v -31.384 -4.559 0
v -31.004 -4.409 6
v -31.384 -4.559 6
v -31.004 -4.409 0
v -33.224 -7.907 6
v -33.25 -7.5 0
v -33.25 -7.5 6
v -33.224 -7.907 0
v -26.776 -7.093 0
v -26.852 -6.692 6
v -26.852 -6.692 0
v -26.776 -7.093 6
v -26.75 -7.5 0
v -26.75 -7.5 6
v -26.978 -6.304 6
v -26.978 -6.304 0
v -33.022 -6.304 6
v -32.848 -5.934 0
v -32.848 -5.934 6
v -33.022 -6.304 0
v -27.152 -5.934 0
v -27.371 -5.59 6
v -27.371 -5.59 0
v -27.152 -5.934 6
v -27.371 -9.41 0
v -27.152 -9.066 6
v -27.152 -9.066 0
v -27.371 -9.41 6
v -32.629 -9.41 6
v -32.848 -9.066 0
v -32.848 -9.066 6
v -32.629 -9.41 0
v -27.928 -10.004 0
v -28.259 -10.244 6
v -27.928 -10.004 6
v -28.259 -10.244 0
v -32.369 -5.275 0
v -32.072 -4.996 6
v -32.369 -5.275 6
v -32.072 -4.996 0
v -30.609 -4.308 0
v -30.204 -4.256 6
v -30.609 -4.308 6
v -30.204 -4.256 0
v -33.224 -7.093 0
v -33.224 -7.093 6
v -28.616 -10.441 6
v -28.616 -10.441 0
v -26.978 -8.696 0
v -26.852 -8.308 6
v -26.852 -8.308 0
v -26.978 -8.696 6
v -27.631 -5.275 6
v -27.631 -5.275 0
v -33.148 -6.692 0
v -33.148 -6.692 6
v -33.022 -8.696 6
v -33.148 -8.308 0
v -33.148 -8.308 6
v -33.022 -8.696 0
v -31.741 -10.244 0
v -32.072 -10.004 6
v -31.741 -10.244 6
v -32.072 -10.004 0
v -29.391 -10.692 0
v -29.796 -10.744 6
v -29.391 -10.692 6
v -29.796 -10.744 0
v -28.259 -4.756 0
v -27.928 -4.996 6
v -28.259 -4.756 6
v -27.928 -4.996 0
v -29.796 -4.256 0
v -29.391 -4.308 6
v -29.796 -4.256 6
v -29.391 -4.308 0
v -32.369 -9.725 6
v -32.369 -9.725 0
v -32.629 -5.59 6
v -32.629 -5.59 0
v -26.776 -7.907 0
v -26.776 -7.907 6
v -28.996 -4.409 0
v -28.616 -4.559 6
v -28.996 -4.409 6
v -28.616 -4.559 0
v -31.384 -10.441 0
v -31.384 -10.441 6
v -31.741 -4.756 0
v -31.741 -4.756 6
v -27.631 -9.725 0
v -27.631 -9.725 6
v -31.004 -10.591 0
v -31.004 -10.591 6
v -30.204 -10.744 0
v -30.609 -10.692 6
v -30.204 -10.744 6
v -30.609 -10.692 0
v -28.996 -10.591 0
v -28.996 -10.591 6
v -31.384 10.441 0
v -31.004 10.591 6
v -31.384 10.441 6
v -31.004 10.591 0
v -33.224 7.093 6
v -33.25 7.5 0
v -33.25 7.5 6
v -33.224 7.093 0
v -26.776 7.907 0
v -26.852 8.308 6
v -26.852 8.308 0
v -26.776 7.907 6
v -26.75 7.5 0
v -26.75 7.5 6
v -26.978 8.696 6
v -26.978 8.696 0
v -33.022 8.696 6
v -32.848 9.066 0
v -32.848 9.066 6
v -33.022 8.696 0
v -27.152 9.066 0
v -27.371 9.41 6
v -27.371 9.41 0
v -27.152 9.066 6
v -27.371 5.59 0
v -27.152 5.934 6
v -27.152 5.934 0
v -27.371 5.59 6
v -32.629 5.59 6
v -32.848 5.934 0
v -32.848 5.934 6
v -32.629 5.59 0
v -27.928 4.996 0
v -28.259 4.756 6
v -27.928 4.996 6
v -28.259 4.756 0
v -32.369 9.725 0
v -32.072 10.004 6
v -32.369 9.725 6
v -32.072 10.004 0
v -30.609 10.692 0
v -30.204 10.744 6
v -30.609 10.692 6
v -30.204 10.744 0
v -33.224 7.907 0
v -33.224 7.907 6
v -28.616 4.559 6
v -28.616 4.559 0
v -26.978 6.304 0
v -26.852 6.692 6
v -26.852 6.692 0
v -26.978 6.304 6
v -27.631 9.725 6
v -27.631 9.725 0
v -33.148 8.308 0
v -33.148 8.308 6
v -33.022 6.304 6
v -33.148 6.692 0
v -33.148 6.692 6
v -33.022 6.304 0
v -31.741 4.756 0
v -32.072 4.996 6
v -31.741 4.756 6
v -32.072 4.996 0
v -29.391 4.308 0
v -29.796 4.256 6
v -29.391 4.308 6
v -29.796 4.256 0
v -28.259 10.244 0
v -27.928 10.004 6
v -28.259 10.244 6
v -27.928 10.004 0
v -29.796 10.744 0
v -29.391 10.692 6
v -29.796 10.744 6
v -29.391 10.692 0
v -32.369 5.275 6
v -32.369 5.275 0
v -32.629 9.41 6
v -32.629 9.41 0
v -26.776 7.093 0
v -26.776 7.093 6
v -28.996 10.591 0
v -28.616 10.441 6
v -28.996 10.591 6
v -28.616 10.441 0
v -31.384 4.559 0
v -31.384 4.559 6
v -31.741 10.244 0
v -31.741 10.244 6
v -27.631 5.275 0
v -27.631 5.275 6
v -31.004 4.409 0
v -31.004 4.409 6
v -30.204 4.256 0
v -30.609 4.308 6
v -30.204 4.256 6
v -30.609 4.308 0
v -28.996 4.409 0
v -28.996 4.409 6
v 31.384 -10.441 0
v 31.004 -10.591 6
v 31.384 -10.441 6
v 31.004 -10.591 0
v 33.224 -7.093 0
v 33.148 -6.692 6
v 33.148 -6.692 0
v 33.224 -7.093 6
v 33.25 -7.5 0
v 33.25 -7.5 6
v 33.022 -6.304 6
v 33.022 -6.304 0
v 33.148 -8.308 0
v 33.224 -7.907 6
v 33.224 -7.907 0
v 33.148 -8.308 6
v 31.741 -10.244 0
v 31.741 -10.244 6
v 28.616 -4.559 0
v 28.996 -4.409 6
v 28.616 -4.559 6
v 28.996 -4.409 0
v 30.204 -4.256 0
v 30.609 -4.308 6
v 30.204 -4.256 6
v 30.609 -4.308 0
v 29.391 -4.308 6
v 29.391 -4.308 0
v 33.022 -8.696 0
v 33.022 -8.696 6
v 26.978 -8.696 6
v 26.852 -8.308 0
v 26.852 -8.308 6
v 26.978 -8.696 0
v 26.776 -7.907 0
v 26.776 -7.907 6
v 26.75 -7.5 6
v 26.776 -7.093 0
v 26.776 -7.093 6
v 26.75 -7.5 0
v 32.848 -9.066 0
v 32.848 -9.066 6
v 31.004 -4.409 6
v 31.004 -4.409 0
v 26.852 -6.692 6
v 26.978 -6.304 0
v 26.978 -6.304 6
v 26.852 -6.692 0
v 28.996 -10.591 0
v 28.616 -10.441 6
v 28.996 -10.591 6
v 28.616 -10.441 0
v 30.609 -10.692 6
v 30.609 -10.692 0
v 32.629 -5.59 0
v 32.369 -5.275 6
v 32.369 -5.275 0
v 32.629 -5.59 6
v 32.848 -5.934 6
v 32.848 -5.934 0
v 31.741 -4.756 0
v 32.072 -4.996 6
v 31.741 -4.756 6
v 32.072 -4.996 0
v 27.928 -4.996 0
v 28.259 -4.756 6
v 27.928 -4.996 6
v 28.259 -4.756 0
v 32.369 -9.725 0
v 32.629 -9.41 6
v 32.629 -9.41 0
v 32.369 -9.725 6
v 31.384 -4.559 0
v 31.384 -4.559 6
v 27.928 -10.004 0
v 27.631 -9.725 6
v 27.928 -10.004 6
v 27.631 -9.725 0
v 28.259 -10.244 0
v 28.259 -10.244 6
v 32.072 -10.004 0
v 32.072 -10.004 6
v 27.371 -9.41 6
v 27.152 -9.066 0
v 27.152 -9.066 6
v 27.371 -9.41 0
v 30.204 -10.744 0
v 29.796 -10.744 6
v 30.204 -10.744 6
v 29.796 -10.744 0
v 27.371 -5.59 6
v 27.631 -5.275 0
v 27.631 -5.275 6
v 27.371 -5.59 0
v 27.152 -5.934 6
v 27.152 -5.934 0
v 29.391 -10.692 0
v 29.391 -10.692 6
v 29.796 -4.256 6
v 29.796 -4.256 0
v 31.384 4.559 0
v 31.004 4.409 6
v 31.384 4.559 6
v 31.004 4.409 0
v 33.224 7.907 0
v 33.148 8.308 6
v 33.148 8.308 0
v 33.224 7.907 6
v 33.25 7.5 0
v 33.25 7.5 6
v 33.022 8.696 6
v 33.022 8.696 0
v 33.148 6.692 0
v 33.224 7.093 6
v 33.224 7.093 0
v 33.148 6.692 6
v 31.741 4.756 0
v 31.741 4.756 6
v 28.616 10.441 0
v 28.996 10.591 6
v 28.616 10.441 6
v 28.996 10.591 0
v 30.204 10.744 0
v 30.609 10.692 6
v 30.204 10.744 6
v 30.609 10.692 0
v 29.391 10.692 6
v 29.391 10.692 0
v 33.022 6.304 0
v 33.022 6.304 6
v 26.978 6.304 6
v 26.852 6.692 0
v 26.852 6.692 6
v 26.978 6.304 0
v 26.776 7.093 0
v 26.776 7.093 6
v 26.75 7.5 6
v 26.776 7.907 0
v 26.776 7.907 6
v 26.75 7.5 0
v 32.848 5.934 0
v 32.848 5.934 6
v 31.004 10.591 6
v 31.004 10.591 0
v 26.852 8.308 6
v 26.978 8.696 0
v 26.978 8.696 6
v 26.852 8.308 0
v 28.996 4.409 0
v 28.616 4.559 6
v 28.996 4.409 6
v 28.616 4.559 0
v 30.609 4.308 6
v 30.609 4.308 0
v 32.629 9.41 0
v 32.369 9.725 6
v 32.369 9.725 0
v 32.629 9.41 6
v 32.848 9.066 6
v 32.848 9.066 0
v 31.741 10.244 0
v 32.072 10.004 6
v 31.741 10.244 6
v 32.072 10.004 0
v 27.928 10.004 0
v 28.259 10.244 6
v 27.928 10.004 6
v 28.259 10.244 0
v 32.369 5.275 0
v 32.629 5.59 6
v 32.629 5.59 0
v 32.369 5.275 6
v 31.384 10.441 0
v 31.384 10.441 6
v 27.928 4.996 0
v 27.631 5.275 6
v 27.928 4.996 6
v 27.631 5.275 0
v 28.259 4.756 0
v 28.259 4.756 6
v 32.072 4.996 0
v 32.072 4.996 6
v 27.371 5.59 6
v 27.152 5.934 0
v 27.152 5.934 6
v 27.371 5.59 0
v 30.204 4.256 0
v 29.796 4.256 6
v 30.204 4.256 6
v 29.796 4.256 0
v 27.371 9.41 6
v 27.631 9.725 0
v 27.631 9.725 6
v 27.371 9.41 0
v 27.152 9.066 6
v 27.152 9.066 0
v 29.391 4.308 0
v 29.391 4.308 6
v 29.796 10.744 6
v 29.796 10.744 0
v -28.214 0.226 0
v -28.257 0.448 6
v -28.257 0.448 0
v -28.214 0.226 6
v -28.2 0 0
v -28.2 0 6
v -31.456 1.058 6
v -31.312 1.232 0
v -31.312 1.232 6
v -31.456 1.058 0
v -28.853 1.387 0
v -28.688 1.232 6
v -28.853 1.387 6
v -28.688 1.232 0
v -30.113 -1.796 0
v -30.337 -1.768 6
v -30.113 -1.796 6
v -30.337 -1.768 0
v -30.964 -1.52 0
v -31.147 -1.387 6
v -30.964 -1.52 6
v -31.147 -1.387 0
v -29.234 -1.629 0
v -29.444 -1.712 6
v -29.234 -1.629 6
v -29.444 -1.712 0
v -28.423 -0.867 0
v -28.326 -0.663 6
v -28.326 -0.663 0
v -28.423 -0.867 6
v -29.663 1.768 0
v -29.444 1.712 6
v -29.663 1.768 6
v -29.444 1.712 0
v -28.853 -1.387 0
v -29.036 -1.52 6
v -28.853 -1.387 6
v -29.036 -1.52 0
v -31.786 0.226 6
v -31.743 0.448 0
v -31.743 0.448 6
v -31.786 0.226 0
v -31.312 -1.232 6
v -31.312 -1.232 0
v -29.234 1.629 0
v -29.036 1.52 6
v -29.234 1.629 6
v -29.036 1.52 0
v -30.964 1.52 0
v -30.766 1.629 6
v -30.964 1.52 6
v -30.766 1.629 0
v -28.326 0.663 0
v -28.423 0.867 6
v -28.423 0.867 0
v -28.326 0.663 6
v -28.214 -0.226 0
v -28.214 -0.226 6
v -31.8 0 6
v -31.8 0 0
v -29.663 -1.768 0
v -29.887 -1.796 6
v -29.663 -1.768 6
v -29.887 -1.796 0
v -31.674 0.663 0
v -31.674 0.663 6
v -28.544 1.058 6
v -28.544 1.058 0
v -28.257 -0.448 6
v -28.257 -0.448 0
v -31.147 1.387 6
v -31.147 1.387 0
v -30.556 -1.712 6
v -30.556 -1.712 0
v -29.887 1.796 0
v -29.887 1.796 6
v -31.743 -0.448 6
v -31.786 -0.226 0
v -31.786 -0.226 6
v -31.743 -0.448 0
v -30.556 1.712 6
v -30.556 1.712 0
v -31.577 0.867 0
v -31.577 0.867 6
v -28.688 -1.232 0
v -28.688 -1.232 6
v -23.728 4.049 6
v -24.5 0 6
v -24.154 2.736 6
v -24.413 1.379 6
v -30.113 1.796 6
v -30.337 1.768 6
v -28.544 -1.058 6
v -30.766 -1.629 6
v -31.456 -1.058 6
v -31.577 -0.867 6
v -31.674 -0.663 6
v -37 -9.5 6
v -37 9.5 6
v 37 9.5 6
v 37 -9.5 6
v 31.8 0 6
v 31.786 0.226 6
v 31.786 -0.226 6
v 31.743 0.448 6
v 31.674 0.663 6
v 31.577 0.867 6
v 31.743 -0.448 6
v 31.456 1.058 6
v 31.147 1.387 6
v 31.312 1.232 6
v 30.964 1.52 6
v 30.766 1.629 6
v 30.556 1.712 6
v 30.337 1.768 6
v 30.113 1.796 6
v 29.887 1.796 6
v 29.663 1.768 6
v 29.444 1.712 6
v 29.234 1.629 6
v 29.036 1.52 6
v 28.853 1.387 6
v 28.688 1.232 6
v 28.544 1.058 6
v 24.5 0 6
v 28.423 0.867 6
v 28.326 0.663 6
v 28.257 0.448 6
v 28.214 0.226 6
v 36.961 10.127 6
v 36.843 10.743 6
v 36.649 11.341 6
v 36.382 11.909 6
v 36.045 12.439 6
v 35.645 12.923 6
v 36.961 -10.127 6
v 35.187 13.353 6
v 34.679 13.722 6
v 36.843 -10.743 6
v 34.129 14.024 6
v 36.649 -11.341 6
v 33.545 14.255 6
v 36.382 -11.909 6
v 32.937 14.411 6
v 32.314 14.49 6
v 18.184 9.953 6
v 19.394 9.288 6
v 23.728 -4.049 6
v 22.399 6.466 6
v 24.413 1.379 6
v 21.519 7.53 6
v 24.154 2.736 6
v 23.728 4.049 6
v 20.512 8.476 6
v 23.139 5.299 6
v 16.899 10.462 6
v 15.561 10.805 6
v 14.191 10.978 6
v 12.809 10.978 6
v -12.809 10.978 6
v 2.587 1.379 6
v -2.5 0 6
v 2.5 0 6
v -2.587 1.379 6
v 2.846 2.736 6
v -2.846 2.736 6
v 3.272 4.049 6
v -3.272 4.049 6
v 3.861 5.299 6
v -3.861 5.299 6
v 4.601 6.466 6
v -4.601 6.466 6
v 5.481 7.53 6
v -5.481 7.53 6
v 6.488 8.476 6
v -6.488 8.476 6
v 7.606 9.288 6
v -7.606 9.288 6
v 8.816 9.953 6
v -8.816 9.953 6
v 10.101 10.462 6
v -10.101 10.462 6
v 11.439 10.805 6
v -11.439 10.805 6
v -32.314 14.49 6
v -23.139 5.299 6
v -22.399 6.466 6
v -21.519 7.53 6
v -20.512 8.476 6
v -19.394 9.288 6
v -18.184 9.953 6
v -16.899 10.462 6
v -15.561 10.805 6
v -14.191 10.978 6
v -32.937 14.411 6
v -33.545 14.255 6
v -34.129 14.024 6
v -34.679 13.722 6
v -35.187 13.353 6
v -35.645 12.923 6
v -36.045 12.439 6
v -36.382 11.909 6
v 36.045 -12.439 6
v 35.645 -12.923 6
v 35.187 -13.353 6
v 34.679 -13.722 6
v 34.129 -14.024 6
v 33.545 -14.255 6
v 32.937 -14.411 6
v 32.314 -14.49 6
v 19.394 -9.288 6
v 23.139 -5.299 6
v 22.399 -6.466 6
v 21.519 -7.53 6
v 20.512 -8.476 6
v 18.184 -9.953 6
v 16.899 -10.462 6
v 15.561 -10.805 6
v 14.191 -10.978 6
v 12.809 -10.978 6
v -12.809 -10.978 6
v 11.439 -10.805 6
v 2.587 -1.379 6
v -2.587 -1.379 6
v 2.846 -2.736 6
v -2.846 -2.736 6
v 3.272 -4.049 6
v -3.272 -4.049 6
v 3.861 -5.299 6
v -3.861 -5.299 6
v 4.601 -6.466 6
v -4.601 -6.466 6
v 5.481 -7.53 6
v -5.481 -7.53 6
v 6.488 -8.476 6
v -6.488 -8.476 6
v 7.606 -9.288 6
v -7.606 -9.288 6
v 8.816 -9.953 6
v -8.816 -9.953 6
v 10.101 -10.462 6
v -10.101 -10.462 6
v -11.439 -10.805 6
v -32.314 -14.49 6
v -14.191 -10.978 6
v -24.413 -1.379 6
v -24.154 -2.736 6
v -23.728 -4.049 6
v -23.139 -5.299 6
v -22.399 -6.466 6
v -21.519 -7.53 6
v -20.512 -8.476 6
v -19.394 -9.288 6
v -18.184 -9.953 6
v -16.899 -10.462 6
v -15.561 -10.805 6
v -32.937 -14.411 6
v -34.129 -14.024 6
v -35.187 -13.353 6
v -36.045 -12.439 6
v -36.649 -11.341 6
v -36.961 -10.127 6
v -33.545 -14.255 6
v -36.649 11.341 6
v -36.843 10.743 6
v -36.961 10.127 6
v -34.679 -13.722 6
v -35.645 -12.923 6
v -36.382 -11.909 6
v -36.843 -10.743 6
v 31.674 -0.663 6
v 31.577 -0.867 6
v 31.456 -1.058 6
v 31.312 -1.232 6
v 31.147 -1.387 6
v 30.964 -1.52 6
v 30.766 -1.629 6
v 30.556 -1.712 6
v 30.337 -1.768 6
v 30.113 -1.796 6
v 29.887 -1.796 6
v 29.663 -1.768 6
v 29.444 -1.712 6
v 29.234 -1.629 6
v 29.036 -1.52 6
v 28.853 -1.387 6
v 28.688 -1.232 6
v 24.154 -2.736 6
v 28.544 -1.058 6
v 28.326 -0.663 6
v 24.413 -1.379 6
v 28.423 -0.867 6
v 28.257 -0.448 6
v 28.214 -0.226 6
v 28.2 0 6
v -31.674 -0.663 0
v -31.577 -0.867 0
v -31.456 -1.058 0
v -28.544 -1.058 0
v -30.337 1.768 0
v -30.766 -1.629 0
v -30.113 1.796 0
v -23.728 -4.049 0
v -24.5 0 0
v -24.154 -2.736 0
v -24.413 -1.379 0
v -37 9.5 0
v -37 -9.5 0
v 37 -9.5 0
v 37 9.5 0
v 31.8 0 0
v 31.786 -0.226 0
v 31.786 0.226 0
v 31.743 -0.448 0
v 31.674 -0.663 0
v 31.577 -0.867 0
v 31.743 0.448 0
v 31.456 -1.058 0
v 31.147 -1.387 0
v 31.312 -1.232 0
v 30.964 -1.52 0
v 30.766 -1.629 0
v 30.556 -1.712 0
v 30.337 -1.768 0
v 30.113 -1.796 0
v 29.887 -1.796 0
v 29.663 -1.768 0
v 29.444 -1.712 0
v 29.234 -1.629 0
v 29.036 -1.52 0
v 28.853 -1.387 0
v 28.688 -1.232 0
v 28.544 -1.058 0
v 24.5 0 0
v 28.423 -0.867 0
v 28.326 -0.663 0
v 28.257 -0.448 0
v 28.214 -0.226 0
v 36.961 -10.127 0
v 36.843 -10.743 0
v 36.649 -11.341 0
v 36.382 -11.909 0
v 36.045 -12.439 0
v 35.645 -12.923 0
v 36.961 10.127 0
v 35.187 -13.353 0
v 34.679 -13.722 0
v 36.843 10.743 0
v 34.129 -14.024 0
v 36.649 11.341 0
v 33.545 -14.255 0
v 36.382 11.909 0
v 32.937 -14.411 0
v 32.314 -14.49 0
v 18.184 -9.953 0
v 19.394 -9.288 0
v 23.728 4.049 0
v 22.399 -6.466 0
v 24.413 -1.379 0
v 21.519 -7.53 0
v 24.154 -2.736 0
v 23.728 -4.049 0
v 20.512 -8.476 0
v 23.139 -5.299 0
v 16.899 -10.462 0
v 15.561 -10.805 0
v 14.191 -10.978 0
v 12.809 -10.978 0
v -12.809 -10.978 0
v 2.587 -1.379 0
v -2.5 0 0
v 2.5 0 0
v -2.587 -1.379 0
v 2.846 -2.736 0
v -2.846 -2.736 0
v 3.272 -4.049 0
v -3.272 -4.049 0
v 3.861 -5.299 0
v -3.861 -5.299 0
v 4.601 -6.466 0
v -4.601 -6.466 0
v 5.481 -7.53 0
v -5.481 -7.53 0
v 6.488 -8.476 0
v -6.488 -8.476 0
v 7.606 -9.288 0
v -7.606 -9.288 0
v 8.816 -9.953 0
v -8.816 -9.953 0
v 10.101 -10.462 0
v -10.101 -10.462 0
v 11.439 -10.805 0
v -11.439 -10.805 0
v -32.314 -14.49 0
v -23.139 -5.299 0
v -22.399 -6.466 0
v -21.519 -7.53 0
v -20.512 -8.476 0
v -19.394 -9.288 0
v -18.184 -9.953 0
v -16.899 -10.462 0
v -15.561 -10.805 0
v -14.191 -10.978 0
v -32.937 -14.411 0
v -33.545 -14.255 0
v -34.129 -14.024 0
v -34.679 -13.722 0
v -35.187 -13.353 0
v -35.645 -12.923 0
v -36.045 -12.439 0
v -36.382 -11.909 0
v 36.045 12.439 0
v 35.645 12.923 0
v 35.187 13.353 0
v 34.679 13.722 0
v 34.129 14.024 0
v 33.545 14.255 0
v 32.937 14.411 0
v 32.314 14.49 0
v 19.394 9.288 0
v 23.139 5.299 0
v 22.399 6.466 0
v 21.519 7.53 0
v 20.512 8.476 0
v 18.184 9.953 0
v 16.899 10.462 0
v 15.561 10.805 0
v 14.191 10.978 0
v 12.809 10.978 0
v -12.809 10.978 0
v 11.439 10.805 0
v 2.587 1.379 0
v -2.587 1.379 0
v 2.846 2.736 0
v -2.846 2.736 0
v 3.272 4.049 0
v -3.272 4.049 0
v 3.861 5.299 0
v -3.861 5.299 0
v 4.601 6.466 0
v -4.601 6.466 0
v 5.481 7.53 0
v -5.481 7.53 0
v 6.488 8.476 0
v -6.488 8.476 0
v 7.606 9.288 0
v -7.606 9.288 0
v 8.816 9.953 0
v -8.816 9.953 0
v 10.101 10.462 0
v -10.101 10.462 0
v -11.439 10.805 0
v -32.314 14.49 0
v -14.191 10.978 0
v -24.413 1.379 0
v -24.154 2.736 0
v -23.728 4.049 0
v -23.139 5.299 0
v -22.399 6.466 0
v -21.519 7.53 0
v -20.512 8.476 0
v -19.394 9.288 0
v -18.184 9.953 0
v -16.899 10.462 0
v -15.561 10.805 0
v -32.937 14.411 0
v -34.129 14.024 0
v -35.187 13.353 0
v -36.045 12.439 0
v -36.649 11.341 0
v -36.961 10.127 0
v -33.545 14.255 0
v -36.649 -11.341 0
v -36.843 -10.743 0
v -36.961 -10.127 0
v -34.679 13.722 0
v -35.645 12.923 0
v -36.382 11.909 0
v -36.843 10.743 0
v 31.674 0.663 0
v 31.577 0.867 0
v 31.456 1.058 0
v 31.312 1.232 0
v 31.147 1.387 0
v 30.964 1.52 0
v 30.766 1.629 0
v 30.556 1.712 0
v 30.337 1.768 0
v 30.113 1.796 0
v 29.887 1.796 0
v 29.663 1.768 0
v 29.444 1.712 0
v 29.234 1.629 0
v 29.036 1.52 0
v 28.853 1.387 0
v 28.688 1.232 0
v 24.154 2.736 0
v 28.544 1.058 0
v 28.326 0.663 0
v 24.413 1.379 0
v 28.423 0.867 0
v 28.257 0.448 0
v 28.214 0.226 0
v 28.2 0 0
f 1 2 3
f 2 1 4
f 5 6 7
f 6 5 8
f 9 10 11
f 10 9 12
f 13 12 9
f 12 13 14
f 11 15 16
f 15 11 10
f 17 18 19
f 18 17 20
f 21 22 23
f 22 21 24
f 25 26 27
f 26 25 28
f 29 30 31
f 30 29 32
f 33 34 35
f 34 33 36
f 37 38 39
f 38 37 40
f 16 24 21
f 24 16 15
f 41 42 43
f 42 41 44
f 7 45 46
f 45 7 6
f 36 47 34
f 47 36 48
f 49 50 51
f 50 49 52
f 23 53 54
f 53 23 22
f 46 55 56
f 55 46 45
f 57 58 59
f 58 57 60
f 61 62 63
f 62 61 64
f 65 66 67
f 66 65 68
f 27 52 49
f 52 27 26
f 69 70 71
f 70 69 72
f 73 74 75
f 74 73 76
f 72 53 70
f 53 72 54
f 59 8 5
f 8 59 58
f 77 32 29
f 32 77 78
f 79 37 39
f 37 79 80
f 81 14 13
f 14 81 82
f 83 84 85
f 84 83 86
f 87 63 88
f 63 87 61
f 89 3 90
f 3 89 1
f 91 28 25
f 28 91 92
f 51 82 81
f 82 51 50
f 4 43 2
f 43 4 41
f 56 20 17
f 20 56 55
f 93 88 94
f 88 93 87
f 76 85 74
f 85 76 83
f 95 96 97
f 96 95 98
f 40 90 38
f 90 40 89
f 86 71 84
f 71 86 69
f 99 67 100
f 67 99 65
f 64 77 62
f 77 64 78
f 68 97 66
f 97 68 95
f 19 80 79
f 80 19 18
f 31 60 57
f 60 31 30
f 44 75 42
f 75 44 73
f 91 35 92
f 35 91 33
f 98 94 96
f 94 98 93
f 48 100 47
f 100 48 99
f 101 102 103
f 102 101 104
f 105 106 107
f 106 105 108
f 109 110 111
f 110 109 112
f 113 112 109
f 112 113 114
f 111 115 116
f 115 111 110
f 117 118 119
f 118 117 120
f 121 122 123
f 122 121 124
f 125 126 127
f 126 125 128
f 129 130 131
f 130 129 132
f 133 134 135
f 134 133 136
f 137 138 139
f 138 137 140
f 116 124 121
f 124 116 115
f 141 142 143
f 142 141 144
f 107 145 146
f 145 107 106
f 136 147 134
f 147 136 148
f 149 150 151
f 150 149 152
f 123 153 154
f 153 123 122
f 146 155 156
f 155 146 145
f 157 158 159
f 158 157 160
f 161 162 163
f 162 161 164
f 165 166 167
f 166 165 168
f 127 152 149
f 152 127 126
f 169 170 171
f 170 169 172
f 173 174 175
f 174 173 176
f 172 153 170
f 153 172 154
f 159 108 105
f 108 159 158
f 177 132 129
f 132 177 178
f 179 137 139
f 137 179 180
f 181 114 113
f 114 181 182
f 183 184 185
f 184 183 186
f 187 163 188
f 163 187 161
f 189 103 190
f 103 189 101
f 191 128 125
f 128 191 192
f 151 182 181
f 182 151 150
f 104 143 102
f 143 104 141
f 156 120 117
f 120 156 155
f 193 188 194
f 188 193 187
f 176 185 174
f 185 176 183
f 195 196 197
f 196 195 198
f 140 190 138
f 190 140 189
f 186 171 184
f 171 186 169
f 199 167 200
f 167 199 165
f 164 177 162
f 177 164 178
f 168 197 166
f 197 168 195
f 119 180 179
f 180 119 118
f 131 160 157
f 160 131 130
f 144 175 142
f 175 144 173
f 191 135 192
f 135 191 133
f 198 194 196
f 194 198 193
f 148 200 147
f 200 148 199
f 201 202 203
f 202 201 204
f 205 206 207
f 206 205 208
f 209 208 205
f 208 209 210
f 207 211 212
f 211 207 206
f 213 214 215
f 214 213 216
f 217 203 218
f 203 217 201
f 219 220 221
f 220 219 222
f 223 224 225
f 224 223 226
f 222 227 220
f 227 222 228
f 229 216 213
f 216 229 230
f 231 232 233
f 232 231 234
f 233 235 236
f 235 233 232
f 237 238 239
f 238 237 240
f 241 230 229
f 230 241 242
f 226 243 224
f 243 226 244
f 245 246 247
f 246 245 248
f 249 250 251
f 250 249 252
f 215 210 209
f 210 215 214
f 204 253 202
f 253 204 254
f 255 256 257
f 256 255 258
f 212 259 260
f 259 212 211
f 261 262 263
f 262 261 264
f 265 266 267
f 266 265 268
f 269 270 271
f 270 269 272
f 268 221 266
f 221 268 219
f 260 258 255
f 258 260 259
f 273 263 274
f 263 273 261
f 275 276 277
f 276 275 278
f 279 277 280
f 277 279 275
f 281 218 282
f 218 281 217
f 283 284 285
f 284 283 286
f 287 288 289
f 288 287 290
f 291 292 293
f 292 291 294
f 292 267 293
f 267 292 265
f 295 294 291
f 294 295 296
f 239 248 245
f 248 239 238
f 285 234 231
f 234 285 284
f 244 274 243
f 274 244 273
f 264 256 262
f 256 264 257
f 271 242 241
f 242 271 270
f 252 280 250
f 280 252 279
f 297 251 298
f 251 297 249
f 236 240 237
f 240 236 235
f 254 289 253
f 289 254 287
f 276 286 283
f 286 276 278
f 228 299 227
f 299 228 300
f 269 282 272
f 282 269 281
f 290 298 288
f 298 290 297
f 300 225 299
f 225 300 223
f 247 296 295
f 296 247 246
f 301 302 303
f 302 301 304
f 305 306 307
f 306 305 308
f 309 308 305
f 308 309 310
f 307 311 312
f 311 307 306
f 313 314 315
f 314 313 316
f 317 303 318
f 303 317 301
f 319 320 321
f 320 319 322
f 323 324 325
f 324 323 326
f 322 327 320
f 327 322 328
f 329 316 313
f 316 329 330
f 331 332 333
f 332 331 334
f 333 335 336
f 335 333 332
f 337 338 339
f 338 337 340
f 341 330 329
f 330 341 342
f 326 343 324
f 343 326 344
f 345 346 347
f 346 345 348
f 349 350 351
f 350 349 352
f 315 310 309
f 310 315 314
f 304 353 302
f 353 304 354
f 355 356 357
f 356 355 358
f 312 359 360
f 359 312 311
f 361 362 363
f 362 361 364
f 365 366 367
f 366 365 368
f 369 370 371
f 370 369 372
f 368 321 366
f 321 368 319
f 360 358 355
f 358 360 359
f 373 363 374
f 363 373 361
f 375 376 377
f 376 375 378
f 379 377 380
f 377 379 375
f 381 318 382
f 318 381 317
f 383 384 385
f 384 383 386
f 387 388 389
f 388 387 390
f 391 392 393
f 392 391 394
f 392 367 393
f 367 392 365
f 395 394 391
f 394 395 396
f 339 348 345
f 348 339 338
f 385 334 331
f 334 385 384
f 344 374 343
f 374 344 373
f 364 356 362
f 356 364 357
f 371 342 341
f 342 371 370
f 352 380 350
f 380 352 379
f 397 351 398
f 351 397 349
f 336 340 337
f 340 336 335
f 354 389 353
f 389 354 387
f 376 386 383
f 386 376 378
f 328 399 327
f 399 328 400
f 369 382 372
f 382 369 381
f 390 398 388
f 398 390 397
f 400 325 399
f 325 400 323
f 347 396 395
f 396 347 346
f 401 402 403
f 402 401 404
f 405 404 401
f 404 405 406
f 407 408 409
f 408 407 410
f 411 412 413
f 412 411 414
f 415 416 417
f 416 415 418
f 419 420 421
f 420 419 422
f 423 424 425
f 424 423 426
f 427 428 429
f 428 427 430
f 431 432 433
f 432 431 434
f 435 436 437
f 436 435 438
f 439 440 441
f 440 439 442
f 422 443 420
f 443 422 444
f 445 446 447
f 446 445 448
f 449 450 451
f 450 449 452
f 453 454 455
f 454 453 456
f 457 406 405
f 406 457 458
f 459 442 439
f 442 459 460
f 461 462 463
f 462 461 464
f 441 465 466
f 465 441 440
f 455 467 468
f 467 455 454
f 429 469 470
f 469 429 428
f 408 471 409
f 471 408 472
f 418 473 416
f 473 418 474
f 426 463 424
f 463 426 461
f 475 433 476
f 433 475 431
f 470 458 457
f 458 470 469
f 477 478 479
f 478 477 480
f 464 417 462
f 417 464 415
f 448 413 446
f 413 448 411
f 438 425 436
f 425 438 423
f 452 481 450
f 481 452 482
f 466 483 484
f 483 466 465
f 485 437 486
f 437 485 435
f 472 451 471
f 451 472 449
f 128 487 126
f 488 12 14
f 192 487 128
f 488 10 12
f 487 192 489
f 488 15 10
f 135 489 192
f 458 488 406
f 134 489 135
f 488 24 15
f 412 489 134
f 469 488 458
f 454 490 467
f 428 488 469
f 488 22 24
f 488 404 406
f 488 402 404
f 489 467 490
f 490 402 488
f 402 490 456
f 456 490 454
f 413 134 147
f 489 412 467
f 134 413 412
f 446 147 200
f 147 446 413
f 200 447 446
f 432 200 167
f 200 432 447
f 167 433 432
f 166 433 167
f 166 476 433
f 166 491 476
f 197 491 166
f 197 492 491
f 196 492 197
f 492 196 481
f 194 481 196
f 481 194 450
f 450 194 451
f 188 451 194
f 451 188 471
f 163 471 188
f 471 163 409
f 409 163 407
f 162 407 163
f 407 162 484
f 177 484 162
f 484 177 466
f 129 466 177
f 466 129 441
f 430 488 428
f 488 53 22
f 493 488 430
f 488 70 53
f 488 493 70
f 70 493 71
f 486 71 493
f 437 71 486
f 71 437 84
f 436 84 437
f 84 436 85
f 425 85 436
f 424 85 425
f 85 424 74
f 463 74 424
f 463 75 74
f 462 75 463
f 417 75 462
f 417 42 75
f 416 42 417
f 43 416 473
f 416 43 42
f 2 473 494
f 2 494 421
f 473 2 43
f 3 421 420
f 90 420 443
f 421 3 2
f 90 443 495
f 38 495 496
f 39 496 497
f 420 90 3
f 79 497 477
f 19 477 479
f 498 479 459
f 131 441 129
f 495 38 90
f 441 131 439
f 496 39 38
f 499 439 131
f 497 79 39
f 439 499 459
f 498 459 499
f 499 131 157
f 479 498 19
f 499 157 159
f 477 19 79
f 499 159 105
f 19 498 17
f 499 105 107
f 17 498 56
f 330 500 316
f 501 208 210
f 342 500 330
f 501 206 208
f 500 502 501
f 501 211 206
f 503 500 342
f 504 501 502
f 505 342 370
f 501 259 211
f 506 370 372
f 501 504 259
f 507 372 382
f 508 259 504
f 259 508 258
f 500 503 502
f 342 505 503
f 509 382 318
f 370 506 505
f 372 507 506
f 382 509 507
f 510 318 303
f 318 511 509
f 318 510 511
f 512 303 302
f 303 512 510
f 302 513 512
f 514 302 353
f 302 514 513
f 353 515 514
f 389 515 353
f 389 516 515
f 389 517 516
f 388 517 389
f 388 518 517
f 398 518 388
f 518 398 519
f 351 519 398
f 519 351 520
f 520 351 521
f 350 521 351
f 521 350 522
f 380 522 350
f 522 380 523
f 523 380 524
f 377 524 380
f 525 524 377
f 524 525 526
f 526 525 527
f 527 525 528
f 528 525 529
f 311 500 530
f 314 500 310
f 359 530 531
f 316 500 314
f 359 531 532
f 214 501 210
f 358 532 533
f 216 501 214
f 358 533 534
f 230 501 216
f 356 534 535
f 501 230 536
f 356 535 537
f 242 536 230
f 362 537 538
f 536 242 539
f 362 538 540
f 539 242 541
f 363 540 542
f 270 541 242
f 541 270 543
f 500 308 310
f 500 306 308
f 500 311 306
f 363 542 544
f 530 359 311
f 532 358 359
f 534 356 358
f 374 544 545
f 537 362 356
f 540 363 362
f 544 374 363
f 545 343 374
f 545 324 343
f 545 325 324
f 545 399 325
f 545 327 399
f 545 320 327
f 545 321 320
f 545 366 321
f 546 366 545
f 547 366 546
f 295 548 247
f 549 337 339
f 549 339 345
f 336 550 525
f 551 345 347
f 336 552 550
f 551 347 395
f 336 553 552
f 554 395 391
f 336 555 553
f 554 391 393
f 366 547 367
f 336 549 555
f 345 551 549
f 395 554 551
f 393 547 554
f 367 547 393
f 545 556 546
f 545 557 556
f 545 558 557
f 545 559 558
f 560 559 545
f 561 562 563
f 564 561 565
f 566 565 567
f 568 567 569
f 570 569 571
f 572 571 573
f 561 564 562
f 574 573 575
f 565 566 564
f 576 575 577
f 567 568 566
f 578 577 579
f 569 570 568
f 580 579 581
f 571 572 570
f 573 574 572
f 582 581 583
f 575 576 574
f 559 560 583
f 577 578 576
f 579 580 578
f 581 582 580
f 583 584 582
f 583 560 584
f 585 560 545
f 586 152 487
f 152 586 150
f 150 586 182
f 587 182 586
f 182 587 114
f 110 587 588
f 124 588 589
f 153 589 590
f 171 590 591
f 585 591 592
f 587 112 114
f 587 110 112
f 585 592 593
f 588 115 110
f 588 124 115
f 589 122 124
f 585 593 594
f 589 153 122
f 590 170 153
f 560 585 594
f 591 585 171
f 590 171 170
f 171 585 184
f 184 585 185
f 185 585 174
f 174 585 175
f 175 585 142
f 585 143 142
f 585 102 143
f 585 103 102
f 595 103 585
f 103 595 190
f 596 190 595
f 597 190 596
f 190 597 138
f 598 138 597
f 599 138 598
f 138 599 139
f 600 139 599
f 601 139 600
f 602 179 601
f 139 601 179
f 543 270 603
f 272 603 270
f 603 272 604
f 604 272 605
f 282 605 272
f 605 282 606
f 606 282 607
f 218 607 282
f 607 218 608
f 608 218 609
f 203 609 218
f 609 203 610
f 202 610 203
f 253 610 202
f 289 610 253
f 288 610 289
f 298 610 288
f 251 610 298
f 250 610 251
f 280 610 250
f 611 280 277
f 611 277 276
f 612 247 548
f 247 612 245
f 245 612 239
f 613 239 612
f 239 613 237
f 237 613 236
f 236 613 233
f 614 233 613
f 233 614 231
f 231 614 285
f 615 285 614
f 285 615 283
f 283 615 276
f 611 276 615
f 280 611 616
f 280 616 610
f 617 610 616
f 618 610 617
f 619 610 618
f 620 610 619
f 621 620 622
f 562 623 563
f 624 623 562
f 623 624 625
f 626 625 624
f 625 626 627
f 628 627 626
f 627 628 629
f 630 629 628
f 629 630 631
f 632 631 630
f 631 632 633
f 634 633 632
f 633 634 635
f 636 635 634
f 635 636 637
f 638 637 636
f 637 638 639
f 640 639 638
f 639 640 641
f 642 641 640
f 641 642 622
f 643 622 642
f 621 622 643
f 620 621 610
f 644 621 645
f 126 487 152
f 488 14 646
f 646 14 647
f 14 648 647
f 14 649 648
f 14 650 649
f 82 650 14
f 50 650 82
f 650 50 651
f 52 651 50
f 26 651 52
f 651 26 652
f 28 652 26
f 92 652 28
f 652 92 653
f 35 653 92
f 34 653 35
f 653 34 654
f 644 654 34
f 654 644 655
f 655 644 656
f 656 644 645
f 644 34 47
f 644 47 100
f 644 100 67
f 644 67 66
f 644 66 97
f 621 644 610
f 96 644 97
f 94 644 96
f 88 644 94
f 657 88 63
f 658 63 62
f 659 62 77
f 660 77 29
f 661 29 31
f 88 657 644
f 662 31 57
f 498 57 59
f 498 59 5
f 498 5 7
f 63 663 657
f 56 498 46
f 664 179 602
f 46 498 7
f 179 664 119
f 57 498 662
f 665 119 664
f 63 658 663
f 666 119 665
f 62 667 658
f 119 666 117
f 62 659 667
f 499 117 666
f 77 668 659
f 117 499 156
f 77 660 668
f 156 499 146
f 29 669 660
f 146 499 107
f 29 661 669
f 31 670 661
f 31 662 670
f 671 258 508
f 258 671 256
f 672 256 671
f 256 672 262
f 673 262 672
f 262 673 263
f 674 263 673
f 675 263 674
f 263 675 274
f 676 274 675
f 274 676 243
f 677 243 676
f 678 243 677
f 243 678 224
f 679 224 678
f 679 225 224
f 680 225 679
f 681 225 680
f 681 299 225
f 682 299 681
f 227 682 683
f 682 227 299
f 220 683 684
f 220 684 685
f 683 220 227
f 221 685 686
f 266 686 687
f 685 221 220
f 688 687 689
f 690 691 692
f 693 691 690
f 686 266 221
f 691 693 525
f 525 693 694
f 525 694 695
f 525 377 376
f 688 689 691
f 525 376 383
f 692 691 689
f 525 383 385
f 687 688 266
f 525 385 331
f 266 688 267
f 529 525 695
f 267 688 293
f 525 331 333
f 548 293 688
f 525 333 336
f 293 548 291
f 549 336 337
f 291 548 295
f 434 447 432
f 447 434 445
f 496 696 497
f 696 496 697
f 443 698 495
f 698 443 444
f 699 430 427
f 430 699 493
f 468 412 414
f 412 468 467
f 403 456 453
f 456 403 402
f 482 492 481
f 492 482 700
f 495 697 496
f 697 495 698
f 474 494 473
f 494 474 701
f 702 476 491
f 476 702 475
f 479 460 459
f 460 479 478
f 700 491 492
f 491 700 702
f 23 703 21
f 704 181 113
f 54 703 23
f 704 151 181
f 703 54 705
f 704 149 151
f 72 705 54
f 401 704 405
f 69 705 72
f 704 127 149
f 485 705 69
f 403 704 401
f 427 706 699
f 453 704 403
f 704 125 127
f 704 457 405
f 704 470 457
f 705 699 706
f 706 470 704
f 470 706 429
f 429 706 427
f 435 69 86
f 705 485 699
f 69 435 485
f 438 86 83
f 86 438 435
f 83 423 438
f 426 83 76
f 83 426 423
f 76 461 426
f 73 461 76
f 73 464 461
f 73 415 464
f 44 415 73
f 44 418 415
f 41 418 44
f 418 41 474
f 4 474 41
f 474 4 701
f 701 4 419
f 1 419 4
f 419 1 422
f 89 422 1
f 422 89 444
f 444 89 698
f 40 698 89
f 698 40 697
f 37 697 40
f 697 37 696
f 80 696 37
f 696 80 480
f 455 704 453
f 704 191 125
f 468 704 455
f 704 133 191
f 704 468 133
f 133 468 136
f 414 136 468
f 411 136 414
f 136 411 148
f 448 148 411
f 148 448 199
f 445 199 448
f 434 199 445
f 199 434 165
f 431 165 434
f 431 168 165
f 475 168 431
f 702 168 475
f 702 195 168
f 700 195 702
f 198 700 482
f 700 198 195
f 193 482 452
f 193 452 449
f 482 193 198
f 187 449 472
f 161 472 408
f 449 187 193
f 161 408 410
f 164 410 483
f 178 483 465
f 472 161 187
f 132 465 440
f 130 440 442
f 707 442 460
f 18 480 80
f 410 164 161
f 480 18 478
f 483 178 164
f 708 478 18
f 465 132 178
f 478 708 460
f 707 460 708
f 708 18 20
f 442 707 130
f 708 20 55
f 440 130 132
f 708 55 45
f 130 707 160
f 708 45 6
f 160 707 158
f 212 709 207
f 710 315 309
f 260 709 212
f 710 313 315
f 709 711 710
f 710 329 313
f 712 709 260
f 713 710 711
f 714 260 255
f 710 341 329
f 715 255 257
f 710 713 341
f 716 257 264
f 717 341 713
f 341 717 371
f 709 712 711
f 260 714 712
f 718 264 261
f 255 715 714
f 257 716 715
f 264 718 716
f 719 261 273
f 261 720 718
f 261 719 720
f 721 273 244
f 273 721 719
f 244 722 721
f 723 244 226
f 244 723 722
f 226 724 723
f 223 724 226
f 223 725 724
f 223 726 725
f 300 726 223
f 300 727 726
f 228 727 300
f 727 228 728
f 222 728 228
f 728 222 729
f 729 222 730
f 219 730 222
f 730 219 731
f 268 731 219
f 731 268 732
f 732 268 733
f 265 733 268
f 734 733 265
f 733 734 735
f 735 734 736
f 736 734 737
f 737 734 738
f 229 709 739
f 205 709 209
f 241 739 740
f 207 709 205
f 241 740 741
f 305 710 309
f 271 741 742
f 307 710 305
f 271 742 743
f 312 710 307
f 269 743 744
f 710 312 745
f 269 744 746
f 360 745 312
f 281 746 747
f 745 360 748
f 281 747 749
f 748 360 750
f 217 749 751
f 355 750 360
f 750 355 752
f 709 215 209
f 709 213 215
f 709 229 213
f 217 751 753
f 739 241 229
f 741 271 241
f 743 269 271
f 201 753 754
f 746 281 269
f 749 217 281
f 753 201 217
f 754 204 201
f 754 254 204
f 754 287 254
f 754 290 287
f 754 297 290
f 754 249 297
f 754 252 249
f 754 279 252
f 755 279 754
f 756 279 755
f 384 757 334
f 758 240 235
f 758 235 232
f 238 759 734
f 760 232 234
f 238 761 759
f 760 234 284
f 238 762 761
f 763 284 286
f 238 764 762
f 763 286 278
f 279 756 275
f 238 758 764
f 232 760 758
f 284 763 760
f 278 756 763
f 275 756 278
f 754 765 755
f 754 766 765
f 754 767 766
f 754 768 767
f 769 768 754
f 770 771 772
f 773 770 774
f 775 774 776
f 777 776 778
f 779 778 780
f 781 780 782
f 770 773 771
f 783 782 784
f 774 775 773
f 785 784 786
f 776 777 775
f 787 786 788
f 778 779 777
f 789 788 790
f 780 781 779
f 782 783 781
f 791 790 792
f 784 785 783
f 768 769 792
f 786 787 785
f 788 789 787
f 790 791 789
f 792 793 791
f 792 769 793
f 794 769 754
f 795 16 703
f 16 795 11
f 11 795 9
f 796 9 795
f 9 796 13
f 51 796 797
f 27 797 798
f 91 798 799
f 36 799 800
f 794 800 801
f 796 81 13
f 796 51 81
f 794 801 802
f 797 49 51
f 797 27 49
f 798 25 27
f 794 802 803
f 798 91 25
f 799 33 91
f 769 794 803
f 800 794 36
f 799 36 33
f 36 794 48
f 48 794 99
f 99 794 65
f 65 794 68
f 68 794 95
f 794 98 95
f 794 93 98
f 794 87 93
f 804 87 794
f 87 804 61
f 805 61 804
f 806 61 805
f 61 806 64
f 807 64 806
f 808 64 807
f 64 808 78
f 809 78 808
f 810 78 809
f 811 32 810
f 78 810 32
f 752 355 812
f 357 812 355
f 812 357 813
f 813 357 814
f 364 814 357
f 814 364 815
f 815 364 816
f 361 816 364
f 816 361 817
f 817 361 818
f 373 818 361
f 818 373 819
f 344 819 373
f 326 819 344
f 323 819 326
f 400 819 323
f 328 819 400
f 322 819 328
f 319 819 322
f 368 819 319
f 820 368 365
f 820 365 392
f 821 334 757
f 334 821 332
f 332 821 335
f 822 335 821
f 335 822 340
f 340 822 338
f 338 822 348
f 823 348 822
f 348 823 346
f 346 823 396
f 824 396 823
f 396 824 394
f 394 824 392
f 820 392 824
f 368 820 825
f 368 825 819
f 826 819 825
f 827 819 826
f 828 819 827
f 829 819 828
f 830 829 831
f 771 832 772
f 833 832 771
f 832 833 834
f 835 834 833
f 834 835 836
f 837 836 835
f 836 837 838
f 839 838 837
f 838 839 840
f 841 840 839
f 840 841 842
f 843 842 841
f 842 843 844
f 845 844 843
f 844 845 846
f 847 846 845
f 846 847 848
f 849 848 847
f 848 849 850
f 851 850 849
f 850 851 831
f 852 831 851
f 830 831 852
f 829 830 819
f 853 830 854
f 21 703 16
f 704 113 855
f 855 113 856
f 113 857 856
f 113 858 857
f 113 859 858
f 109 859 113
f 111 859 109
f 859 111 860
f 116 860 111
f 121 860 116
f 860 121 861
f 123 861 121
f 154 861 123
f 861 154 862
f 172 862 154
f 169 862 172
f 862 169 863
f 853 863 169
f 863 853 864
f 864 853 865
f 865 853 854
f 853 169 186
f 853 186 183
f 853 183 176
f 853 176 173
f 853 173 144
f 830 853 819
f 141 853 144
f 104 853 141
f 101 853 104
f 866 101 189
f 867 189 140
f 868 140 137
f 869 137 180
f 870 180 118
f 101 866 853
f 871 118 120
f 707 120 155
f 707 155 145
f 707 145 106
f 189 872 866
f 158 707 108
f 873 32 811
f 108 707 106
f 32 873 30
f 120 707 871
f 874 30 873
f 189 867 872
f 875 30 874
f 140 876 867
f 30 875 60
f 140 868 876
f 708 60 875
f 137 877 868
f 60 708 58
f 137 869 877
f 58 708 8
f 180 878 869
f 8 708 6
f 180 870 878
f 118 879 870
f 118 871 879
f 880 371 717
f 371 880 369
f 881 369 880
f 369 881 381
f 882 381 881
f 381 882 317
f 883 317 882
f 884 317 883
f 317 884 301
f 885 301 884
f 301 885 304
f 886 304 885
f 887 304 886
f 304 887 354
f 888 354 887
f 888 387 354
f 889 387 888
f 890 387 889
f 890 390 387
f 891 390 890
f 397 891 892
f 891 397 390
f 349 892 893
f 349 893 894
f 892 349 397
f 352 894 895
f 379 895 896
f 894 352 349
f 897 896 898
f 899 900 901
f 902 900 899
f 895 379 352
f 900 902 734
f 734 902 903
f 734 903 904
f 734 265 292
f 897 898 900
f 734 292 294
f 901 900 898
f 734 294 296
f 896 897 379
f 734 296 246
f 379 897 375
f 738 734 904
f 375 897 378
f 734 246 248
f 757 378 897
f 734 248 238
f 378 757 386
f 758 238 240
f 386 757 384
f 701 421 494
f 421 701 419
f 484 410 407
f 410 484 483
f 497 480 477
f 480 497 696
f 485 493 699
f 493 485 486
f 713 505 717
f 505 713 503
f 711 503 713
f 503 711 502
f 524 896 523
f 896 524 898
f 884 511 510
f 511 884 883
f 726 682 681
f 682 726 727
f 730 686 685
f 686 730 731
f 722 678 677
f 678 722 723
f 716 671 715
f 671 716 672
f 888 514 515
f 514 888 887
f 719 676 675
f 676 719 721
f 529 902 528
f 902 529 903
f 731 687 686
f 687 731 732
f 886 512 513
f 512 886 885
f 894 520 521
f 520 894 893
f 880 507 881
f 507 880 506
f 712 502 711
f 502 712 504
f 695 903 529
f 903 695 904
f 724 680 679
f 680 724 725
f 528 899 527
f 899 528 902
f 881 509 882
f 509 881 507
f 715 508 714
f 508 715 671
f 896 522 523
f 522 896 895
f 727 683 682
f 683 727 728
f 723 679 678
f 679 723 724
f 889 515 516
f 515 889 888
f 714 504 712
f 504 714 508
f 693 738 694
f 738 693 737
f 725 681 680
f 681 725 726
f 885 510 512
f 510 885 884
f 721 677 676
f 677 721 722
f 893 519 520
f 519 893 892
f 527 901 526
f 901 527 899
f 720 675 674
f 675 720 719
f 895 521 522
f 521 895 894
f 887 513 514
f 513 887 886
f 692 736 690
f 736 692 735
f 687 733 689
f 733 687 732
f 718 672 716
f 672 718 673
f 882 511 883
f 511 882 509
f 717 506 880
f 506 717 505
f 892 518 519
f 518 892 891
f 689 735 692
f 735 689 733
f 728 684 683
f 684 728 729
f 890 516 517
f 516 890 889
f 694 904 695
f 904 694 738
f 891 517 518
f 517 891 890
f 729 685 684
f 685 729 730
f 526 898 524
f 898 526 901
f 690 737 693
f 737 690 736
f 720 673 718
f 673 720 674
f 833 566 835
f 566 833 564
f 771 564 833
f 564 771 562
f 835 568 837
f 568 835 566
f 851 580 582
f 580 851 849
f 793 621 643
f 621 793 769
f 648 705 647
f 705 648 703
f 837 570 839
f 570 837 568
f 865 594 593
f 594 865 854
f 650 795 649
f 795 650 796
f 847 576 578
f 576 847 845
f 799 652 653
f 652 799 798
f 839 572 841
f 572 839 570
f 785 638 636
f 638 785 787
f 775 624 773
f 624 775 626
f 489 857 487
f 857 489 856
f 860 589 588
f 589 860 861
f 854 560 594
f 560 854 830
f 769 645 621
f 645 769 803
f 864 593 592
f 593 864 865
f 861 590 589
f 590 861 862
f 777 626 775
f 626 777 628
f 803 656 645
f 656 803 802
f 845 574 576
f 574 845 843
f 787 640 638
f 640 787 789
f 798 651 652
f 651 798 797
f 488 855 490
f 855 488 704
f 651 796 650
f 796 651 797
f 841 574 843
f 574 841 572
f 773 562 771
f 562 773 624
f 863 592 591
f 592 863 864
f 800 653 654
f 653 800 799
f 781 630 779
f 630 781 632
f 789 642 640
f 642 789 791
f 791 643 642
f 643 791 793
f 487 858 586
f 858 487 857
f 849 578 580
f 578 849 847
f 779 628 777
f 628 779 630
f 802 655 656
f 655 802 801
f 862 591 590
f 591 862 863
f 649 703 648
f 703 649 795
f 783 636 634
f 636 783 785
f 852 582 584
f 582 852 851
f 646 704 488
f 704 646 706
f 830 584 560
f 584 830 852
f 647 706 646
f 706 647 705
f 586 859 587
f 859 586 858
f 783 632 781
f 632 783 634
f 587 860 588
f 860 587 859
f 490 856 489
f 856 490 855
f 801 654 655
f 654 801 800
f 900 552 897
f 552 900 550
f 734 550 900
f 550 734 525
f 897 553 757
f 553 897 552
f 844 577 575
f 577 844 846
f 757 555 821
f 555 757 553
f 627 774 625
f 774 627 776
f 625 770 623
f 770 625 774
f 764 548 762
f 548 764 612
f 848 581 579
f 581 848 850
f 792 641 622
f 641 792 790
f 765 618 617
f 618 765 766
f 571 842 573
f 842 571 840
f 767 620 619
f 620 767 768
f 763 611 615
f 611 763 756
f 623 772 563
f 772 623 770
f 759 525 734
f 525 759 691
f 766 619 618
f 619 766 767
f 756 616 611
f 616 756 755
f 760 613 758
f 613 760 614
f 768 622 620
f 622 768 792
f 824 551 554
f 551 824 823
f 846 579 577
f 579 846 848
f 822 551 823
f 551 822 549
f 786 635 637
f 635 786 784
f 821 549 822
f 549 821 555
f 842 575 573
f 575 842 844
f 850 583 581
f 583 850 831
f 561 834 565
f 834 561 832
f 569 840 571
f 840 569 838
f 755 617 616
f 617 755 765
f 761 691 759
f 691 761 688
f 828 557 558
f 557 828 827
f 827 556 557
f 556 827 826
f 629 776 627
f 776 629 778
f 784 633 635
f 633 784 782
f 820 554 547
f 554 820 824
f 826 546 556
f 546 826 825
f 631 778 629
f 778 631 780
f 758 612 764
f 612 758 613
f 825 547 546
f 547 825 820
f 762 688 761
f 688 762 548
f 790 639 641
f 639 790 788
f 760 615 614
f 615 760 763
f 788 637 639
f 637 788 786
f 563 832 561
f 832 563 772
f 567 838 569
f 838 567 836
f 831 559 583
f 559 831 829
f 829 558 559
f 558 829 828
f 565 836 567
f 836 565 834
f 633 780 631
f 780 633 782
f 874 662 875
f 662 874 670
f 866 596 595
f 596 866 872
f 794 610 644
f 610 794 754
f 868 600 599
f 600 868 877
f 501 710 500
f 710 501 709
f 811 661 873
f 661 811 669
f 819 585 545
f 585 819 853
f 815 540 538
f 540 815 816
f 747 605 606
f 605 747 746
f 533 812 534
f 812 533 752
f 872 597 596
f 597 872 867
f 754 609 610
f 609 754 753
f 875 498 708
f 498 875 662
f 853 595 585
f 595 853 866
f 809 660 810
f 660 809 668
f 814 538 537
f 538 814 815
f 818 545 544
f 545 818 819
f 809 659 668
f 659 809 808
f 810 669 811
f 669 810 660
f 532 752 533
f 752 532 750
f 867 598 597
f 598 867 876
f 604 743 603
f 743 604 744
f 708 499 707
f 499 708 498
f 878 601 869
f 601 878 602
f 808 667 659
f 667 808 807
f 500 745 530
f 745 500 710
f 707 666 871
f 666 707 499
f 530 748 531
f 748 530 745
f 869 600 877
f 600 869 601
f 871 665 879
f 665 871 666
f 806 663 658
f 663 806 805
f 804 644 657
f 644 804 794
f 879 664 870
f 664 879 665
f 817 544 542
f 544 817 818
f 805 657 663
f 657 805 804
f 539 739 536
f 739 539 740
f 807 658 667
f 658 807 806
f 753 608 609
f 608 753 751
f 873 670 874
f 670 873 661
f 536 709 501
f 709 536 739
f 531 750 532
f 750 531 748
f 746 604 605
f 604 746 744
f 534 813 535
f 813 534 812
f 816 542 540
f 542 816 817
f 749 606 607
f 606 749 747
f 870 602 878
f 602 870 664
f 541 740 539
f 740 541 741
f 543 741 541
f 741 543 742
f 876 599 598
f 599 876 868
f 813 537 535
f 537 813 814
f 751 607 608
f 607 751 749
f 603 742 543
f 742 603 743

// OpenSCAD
$fn = 50;


difference() {
	union() {
		hull() {
			translate(v = [-32.0000000000, 9.5000000000, 0]) {
				cylinder(h = 6, r = 5);
			}
			translate(v = [32.0000000000, 9.5000000000, 0]) {
				cylinder(h = 6, r = 5);
			}
			translate(v = [-32.0000000000, -9.5000000000, 0]) {
				cylinder(h = 6, r = 5);
			}
			translate(v = [32.0000000000, -9.5000000000, 0]) {
				cylinder(h = 6, r = 5);
			}
		}
	}
	union() {
		#translate(v = [-30.0000000000, -7.5000000000, 0]) {
			cylinder(h = 6, r = 3.2500000000);
		}
		#translate(v = [-30.0000000000, 7.5000000000, 0]) {
			cylinder(h = 6, r = 3.2500000000);
		}
		#translate(v = [30.0000000000, -7.5000000000, 0]) {
			cylinder(h = 6, r = 3.2500000000);
		}
		#translate(v = [30.0000000000, 7.5000000000, 0]) {
			cylinder(h = 6, r = 3.2500000000);
		}
		#translate(v = [-30.0000000000, -7.5000000000, -100.0000000000]) {
			cylinder(h = 200, r = 3.2500000000);
		}
		#translate(v = [-30.0000000000, 7.5000000000, -100.0000000000]) {
			cylinder(h = 200, r = 3.2500000000);
		}
		#translate(v = [30.0000000000, -7.5000000000, -100.0000000000]) {
			cylinder(h = 200, r = 3.2500000000);
		}
		#translate(v = [30.0000000000, 7.5000000000, -100.0000000000]) {
			cylinder(h = 200, r = 3.2500000000);
		}
		#translate(v = [-30.0000000000, -7.5000000000, 0]) {
			cylinder(h = 6, r = 1.8000000000);
		}
		#translate(v = [-30.0000000000, 0.0000000000, 0]) {
			cylinder(h = 6, r = 1.8000000000);
		}
		#translate(v = [-30.0000000000, 7.5000000000, 0]) {
			cylinder(h = 6, r = 1.8000000000);
		}
		#translate(v = [30.0000000000, -7.5000000000, 0]) {
			cylinder(h = 6, r = 1.8000000000);
		}
		#translate(v = [30.0000000000, 0.0000000000, 0]) {
			cylinder(h = 6, r = 1.8000000000);
		}
		#translate(v = [30.0000000000, 7.5000000000, 0]) {
			cylinder(h = 6, r = 1.8000000000);
		}
		#translate(v = [-30.0000000000, -7.5000000000, 0]) {
			cylinder(h = 6, r = 1.8000000000);
		}
		#translate(v = [-30.0000000000, 0.0000000000, 0]) {
			cylinder(h = 6, r = 1.8000000000);
		}
		#translate(v = [-30.0000000000, 7.5000000000, 0]) {
			cylinder(h = 6, r = 1.8000000000);
		}
		#translate(v = [30.0000000000, -7.5000000000, 0]) {
			cylinder(h = 6, r = 1.8000000000);
		}
		#translate(v = [30.0000000000, 0.0000000000, 0]) {
			cylinder(h = 6, r = 1.8000000000);
		}
		#translate(v = [30.0000000000, 7.5000000000, 0]) {
			cylinder(h = 6, r = 1.8000000000);
		}
		#translate(v = [-30.0000000000, -7.5000000000, 0]) {
			cylinder(h = 6, r = 1.8000000000);
		}
		#translate(v = [-30.0000000000, 0.0000000000, 0]) {
			cylinder(h = 6, r = 1.8000000000);
		}
		#translate(v = [-30.0000000000, 7.5000000000, 0]) {
			cylinder(h = 6, r = 1.8000000000);
		}
		#translate(v = [30.0000000000, -7.5000000000, 0]) {
			cylinder(h = 6, r = 1.8000000000);
		}
		#translate(v = [30.0000000000, 0.0000000000, 0]) {
			cylinder(h = 6, r = 1.8000000000);
		}
		#translate(v = [30.0000000000, 7.5000000000, 0]) {
			cylinder(h = 6, r = 1.8000000000);
		}
		#translate(v = [-13.5000000000, 0, 0]) {
			cylinder(h = 6, r = 11.0000000000);
		}
		#translate(v = [13.5000000000, 0, 0]) {
			cylinder(h = 6, r = 11.0000000000);
		}
	}
}
